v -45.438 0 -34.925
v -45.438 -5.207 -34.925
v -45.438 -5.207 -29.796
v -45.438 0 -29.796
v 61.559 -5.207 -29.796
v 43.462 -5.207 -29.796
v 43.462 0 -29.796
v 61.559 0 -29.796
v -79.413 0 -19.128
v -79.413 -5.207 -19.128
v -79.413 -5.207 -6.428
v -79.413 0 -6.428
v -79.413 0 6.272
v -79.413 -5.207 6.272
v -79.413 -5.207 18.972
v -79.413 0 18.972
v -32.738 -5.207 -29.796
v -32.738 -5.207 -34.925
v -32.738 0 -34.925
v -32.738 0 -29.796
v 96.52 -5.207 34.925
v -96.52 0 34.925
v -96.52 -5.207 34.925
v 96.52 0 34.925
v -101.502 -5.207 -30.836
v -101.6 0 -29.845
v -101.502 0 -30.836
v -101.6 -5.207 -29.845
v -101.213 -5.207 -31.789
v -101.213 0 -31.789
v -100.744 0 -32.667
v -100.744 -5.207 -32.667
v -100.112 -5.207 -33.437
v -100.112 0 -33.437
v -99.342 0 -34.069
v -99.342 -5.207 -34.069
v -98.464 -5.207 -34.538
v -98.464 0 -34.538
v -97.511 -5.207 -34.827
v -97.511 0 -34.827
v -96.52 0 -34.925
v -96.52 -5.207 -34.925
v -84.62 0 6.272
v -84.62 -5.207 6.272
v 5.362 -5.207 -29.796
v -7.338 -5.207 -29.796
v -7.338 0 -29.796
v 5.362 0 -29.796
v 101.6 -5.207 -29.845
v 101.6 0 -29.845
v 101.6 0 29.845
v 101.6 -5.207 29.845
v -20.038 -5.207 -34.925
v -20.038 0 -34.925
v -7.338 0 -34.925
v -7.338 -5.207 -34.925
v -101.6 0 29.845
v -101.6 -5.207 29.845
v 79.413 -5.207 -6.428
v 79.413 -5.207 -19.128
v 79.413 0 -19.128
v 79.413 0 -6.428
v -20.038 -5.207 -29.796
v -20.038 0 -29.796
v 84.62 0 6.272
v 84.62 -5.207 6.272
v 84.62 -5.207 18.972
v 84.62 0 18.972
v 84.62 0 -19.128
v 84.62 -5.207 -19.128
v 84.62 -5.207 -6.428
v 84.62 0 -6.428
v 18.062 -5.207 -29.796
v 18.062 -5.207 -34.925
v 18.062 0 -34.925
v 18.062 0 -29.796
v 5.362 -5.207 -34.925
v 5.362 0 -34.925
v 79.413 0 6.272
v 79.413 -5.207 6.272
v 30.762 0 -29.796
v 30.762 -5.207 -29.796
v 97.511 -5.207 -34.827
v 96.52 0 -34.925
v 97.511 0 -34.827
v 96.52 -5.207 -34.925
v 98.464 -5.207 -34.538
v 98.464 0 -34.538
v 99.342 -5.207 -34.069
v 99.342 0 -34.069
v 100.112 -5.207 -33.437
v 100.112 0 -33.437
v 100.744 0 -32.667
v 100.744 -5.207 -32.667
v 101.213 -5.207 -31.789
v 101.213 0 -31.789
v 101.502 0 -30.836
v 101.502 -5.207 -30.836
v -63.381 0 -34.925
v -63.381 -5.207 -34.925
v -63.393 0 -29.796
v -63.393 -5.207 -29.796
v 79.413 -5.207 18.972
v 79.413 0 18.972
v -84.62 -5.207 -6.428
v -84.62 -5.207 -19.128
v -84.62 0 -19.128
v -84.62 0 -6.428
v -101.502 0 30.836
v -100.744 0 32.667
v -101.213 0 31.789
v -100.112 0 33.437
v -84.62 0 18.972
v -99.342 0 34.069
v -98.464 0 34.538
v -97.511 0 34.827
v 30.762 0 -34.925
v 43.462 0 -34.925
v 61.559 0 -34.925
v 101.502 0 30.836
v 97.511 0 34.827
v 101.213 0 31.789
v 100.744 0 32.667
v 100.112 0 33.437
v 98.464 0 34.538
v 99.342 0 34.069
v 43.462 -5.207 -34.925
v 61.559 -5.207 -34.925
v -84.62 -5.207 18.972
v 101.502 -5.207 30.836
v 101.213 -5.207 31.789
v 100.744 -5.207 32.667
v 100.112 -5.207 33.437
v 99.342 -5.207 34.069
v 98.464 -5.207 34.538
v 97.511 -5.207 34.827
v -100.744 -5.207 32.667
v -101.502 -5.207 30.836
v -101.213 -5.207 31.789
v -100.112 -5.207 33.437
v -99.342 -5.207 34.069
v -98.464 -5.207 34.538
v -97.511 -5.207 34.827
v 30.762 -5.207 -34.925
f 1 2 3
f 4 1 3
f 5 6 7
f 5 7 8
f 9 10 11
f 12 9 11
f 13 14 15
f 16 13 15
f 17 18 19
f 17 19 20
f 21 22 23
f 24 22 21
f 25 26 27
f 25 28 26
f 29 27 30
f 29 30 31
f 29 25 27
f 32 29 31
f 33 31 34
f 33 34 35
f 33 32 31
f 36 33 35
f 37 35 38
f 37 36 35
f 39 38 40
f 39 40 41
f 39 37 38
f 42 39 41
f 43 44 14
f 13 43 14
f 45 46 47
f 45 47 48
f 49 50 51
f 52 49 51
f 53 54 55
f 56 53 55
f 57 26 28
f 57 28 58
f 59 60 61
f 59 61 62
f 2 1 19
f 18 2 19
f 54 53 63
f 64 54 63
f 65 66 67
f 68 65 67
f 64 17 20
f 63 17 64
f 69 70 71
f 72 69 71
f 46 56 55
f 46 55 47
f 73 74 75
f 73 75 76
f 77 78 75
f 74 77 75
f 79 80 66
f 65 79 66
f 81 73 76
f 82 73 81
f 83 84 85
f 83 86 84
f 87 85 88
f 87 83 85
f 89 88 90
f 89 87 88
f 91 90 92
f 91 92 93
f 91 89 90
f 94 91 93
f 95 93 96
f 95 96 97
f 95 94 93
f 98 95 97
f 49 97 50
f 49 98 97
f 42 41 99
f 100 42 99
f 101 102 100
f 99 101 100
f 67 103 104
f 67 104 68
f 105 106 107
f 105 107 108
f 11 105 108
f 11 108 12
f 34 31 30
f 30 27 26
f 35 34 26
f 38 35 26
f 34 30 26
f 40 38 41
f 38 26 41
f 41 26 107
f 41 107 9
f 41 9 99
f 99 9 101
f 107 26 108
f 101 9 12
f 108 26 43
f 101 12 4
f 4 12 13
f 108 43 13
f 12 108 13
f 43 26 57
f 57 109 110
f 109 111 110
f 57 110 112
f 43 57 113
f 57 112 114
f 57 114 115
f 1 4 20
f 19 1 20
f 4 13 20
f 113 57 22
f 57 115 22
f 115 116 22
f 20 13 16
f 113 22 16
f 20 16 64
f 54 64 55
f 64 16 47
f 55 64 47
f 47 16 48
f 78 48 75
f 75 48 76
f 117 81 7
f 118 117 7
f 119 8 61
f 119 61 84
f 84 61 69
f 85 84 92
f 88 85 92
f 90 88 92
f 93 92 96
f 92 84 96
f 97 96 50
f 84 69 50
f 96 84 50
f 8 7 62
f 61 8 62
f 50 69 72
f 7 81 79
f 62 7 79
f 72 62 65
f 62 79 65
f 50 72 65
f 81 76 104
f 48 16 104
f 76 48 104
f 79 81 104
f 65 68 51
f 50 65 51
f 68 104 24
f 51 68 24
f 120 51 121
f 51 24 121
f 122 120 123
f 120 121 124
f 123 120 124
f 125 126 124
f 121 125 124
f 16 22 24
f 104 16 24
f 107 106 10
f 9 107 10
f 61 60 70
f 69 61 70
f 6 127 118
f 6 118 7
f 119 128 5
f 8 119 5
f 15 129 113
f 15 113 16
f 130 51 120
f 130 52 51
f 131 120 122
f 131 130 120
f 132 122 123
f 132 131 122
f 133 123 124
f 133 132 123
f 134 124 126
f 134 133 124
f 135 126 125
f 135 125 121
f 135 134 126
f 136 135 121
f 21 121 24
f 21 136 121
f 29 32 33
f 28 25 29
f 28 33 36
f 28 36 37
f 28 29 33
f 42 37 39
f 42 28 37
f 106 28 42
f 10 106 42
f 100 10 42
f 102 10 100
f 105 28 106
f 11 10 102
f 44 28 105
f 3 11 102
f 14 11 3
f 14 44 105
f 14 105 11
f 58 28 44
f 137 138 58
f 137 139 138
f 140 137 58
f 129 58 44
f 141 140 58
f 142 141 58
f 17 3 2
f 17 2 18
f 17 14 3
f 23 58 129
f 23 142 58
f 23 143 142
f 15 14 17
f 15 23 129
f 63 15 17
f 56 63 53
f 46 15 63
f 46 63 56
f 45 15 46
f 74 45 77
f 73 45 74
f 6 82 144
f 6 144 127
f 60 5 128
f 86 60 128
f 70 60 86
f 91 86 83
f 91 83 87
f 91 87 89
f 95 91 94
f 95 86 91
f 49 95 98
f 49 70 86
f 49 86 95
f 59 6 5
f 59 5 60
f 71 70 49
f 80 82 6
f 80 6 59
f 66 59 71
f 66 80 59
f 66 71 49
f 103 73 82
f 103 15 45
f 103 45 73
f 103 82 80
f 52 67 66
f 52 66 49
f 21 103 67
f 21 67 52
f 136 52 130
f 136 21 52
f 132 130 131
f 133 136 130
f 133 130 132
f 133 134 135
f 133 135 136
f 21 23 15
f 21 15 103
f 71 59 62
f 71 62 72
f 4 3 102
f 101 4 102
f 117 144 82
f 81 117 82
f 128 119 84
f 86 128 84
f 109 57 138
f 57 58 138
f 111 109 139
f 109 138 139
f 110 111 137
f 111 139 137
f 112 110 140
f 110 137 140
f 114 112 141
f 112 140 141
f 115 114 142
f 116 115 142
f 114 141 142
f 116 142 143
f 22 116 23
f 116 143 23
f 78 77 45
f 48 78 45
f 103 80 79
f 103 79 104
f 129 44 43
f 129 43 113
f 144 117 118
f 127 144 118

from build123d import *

# Parameters (mm, degrees)
F0_W     = 203.2
F0_H     = 69.85
F1_DEPTH = 5.207
F2_R     = 5.08
F3_W     = 5.207
F3_H     = 12.7
F3_W_2   = 12.7
F3_H_2   = 5.129387
F3_W_3   = 18.097754
F4_DEPTH = 5.208


with BuildPart() as f1:
    # F0 (on Front) → F1 (new body)
    with BuildSketch(Plane.XZ):
        Rectangle(F0_W, F0_H)
    extrude(amount=F1_DEPTH)

    # F2
    f2_edges = [f1.edges().sort_by_distance(p)[0] for p in [
        (-101.6, -2.6035, 34.925),
        (-101.6, -2.6035, -34.925),
        (101.6, -2.6035, -34.925),
        (101.6, -2.6035, 34.925),
    ]]
    fillet(f2_edges, radius=F2_R)

    # F3 (on face) → F4 (cut, through all)
    with BuildSketch(Plane.XZ.offset(5.207)):
        with Locations((-82.0166, 12.622387)):
            Rectangle(F3_W, F3_H)
        with Locations((-82.0166, -12.777613)):
            Rectangle(F3_W, F3_H)
        Polygon((-63.380809, -34.925), (-45.438314, -34.925), (-45.438314, -29.795613), (-63.39332, -29.795613), align=None)
        with Locations((-26.388314, -32.360307)):
            Rectangle(F3_W_2, F3_H_2)
        with Locations((-0.988314, -32.360307)):
            Rectangle(F3_W_2, F3_H_2)
        with Locations((24.411686, -32.360307)):
            Rectangle(F3_W_2, F3_H_2)
        with Locations((52.510563, -32.360307)):
            Rectangle(F3_W_3, F3_H_2)
        with Locations((82.0166, -12.777613)):
            Rectangle(F3_W, F3_H)
        with Locations((82.0166, 12.622387)):
            Rectangle(F3_W, F3_H)
    extrude(amount=-F4_DEPTH, mode=Mode.SUBTRACT)


solid = f1.part
